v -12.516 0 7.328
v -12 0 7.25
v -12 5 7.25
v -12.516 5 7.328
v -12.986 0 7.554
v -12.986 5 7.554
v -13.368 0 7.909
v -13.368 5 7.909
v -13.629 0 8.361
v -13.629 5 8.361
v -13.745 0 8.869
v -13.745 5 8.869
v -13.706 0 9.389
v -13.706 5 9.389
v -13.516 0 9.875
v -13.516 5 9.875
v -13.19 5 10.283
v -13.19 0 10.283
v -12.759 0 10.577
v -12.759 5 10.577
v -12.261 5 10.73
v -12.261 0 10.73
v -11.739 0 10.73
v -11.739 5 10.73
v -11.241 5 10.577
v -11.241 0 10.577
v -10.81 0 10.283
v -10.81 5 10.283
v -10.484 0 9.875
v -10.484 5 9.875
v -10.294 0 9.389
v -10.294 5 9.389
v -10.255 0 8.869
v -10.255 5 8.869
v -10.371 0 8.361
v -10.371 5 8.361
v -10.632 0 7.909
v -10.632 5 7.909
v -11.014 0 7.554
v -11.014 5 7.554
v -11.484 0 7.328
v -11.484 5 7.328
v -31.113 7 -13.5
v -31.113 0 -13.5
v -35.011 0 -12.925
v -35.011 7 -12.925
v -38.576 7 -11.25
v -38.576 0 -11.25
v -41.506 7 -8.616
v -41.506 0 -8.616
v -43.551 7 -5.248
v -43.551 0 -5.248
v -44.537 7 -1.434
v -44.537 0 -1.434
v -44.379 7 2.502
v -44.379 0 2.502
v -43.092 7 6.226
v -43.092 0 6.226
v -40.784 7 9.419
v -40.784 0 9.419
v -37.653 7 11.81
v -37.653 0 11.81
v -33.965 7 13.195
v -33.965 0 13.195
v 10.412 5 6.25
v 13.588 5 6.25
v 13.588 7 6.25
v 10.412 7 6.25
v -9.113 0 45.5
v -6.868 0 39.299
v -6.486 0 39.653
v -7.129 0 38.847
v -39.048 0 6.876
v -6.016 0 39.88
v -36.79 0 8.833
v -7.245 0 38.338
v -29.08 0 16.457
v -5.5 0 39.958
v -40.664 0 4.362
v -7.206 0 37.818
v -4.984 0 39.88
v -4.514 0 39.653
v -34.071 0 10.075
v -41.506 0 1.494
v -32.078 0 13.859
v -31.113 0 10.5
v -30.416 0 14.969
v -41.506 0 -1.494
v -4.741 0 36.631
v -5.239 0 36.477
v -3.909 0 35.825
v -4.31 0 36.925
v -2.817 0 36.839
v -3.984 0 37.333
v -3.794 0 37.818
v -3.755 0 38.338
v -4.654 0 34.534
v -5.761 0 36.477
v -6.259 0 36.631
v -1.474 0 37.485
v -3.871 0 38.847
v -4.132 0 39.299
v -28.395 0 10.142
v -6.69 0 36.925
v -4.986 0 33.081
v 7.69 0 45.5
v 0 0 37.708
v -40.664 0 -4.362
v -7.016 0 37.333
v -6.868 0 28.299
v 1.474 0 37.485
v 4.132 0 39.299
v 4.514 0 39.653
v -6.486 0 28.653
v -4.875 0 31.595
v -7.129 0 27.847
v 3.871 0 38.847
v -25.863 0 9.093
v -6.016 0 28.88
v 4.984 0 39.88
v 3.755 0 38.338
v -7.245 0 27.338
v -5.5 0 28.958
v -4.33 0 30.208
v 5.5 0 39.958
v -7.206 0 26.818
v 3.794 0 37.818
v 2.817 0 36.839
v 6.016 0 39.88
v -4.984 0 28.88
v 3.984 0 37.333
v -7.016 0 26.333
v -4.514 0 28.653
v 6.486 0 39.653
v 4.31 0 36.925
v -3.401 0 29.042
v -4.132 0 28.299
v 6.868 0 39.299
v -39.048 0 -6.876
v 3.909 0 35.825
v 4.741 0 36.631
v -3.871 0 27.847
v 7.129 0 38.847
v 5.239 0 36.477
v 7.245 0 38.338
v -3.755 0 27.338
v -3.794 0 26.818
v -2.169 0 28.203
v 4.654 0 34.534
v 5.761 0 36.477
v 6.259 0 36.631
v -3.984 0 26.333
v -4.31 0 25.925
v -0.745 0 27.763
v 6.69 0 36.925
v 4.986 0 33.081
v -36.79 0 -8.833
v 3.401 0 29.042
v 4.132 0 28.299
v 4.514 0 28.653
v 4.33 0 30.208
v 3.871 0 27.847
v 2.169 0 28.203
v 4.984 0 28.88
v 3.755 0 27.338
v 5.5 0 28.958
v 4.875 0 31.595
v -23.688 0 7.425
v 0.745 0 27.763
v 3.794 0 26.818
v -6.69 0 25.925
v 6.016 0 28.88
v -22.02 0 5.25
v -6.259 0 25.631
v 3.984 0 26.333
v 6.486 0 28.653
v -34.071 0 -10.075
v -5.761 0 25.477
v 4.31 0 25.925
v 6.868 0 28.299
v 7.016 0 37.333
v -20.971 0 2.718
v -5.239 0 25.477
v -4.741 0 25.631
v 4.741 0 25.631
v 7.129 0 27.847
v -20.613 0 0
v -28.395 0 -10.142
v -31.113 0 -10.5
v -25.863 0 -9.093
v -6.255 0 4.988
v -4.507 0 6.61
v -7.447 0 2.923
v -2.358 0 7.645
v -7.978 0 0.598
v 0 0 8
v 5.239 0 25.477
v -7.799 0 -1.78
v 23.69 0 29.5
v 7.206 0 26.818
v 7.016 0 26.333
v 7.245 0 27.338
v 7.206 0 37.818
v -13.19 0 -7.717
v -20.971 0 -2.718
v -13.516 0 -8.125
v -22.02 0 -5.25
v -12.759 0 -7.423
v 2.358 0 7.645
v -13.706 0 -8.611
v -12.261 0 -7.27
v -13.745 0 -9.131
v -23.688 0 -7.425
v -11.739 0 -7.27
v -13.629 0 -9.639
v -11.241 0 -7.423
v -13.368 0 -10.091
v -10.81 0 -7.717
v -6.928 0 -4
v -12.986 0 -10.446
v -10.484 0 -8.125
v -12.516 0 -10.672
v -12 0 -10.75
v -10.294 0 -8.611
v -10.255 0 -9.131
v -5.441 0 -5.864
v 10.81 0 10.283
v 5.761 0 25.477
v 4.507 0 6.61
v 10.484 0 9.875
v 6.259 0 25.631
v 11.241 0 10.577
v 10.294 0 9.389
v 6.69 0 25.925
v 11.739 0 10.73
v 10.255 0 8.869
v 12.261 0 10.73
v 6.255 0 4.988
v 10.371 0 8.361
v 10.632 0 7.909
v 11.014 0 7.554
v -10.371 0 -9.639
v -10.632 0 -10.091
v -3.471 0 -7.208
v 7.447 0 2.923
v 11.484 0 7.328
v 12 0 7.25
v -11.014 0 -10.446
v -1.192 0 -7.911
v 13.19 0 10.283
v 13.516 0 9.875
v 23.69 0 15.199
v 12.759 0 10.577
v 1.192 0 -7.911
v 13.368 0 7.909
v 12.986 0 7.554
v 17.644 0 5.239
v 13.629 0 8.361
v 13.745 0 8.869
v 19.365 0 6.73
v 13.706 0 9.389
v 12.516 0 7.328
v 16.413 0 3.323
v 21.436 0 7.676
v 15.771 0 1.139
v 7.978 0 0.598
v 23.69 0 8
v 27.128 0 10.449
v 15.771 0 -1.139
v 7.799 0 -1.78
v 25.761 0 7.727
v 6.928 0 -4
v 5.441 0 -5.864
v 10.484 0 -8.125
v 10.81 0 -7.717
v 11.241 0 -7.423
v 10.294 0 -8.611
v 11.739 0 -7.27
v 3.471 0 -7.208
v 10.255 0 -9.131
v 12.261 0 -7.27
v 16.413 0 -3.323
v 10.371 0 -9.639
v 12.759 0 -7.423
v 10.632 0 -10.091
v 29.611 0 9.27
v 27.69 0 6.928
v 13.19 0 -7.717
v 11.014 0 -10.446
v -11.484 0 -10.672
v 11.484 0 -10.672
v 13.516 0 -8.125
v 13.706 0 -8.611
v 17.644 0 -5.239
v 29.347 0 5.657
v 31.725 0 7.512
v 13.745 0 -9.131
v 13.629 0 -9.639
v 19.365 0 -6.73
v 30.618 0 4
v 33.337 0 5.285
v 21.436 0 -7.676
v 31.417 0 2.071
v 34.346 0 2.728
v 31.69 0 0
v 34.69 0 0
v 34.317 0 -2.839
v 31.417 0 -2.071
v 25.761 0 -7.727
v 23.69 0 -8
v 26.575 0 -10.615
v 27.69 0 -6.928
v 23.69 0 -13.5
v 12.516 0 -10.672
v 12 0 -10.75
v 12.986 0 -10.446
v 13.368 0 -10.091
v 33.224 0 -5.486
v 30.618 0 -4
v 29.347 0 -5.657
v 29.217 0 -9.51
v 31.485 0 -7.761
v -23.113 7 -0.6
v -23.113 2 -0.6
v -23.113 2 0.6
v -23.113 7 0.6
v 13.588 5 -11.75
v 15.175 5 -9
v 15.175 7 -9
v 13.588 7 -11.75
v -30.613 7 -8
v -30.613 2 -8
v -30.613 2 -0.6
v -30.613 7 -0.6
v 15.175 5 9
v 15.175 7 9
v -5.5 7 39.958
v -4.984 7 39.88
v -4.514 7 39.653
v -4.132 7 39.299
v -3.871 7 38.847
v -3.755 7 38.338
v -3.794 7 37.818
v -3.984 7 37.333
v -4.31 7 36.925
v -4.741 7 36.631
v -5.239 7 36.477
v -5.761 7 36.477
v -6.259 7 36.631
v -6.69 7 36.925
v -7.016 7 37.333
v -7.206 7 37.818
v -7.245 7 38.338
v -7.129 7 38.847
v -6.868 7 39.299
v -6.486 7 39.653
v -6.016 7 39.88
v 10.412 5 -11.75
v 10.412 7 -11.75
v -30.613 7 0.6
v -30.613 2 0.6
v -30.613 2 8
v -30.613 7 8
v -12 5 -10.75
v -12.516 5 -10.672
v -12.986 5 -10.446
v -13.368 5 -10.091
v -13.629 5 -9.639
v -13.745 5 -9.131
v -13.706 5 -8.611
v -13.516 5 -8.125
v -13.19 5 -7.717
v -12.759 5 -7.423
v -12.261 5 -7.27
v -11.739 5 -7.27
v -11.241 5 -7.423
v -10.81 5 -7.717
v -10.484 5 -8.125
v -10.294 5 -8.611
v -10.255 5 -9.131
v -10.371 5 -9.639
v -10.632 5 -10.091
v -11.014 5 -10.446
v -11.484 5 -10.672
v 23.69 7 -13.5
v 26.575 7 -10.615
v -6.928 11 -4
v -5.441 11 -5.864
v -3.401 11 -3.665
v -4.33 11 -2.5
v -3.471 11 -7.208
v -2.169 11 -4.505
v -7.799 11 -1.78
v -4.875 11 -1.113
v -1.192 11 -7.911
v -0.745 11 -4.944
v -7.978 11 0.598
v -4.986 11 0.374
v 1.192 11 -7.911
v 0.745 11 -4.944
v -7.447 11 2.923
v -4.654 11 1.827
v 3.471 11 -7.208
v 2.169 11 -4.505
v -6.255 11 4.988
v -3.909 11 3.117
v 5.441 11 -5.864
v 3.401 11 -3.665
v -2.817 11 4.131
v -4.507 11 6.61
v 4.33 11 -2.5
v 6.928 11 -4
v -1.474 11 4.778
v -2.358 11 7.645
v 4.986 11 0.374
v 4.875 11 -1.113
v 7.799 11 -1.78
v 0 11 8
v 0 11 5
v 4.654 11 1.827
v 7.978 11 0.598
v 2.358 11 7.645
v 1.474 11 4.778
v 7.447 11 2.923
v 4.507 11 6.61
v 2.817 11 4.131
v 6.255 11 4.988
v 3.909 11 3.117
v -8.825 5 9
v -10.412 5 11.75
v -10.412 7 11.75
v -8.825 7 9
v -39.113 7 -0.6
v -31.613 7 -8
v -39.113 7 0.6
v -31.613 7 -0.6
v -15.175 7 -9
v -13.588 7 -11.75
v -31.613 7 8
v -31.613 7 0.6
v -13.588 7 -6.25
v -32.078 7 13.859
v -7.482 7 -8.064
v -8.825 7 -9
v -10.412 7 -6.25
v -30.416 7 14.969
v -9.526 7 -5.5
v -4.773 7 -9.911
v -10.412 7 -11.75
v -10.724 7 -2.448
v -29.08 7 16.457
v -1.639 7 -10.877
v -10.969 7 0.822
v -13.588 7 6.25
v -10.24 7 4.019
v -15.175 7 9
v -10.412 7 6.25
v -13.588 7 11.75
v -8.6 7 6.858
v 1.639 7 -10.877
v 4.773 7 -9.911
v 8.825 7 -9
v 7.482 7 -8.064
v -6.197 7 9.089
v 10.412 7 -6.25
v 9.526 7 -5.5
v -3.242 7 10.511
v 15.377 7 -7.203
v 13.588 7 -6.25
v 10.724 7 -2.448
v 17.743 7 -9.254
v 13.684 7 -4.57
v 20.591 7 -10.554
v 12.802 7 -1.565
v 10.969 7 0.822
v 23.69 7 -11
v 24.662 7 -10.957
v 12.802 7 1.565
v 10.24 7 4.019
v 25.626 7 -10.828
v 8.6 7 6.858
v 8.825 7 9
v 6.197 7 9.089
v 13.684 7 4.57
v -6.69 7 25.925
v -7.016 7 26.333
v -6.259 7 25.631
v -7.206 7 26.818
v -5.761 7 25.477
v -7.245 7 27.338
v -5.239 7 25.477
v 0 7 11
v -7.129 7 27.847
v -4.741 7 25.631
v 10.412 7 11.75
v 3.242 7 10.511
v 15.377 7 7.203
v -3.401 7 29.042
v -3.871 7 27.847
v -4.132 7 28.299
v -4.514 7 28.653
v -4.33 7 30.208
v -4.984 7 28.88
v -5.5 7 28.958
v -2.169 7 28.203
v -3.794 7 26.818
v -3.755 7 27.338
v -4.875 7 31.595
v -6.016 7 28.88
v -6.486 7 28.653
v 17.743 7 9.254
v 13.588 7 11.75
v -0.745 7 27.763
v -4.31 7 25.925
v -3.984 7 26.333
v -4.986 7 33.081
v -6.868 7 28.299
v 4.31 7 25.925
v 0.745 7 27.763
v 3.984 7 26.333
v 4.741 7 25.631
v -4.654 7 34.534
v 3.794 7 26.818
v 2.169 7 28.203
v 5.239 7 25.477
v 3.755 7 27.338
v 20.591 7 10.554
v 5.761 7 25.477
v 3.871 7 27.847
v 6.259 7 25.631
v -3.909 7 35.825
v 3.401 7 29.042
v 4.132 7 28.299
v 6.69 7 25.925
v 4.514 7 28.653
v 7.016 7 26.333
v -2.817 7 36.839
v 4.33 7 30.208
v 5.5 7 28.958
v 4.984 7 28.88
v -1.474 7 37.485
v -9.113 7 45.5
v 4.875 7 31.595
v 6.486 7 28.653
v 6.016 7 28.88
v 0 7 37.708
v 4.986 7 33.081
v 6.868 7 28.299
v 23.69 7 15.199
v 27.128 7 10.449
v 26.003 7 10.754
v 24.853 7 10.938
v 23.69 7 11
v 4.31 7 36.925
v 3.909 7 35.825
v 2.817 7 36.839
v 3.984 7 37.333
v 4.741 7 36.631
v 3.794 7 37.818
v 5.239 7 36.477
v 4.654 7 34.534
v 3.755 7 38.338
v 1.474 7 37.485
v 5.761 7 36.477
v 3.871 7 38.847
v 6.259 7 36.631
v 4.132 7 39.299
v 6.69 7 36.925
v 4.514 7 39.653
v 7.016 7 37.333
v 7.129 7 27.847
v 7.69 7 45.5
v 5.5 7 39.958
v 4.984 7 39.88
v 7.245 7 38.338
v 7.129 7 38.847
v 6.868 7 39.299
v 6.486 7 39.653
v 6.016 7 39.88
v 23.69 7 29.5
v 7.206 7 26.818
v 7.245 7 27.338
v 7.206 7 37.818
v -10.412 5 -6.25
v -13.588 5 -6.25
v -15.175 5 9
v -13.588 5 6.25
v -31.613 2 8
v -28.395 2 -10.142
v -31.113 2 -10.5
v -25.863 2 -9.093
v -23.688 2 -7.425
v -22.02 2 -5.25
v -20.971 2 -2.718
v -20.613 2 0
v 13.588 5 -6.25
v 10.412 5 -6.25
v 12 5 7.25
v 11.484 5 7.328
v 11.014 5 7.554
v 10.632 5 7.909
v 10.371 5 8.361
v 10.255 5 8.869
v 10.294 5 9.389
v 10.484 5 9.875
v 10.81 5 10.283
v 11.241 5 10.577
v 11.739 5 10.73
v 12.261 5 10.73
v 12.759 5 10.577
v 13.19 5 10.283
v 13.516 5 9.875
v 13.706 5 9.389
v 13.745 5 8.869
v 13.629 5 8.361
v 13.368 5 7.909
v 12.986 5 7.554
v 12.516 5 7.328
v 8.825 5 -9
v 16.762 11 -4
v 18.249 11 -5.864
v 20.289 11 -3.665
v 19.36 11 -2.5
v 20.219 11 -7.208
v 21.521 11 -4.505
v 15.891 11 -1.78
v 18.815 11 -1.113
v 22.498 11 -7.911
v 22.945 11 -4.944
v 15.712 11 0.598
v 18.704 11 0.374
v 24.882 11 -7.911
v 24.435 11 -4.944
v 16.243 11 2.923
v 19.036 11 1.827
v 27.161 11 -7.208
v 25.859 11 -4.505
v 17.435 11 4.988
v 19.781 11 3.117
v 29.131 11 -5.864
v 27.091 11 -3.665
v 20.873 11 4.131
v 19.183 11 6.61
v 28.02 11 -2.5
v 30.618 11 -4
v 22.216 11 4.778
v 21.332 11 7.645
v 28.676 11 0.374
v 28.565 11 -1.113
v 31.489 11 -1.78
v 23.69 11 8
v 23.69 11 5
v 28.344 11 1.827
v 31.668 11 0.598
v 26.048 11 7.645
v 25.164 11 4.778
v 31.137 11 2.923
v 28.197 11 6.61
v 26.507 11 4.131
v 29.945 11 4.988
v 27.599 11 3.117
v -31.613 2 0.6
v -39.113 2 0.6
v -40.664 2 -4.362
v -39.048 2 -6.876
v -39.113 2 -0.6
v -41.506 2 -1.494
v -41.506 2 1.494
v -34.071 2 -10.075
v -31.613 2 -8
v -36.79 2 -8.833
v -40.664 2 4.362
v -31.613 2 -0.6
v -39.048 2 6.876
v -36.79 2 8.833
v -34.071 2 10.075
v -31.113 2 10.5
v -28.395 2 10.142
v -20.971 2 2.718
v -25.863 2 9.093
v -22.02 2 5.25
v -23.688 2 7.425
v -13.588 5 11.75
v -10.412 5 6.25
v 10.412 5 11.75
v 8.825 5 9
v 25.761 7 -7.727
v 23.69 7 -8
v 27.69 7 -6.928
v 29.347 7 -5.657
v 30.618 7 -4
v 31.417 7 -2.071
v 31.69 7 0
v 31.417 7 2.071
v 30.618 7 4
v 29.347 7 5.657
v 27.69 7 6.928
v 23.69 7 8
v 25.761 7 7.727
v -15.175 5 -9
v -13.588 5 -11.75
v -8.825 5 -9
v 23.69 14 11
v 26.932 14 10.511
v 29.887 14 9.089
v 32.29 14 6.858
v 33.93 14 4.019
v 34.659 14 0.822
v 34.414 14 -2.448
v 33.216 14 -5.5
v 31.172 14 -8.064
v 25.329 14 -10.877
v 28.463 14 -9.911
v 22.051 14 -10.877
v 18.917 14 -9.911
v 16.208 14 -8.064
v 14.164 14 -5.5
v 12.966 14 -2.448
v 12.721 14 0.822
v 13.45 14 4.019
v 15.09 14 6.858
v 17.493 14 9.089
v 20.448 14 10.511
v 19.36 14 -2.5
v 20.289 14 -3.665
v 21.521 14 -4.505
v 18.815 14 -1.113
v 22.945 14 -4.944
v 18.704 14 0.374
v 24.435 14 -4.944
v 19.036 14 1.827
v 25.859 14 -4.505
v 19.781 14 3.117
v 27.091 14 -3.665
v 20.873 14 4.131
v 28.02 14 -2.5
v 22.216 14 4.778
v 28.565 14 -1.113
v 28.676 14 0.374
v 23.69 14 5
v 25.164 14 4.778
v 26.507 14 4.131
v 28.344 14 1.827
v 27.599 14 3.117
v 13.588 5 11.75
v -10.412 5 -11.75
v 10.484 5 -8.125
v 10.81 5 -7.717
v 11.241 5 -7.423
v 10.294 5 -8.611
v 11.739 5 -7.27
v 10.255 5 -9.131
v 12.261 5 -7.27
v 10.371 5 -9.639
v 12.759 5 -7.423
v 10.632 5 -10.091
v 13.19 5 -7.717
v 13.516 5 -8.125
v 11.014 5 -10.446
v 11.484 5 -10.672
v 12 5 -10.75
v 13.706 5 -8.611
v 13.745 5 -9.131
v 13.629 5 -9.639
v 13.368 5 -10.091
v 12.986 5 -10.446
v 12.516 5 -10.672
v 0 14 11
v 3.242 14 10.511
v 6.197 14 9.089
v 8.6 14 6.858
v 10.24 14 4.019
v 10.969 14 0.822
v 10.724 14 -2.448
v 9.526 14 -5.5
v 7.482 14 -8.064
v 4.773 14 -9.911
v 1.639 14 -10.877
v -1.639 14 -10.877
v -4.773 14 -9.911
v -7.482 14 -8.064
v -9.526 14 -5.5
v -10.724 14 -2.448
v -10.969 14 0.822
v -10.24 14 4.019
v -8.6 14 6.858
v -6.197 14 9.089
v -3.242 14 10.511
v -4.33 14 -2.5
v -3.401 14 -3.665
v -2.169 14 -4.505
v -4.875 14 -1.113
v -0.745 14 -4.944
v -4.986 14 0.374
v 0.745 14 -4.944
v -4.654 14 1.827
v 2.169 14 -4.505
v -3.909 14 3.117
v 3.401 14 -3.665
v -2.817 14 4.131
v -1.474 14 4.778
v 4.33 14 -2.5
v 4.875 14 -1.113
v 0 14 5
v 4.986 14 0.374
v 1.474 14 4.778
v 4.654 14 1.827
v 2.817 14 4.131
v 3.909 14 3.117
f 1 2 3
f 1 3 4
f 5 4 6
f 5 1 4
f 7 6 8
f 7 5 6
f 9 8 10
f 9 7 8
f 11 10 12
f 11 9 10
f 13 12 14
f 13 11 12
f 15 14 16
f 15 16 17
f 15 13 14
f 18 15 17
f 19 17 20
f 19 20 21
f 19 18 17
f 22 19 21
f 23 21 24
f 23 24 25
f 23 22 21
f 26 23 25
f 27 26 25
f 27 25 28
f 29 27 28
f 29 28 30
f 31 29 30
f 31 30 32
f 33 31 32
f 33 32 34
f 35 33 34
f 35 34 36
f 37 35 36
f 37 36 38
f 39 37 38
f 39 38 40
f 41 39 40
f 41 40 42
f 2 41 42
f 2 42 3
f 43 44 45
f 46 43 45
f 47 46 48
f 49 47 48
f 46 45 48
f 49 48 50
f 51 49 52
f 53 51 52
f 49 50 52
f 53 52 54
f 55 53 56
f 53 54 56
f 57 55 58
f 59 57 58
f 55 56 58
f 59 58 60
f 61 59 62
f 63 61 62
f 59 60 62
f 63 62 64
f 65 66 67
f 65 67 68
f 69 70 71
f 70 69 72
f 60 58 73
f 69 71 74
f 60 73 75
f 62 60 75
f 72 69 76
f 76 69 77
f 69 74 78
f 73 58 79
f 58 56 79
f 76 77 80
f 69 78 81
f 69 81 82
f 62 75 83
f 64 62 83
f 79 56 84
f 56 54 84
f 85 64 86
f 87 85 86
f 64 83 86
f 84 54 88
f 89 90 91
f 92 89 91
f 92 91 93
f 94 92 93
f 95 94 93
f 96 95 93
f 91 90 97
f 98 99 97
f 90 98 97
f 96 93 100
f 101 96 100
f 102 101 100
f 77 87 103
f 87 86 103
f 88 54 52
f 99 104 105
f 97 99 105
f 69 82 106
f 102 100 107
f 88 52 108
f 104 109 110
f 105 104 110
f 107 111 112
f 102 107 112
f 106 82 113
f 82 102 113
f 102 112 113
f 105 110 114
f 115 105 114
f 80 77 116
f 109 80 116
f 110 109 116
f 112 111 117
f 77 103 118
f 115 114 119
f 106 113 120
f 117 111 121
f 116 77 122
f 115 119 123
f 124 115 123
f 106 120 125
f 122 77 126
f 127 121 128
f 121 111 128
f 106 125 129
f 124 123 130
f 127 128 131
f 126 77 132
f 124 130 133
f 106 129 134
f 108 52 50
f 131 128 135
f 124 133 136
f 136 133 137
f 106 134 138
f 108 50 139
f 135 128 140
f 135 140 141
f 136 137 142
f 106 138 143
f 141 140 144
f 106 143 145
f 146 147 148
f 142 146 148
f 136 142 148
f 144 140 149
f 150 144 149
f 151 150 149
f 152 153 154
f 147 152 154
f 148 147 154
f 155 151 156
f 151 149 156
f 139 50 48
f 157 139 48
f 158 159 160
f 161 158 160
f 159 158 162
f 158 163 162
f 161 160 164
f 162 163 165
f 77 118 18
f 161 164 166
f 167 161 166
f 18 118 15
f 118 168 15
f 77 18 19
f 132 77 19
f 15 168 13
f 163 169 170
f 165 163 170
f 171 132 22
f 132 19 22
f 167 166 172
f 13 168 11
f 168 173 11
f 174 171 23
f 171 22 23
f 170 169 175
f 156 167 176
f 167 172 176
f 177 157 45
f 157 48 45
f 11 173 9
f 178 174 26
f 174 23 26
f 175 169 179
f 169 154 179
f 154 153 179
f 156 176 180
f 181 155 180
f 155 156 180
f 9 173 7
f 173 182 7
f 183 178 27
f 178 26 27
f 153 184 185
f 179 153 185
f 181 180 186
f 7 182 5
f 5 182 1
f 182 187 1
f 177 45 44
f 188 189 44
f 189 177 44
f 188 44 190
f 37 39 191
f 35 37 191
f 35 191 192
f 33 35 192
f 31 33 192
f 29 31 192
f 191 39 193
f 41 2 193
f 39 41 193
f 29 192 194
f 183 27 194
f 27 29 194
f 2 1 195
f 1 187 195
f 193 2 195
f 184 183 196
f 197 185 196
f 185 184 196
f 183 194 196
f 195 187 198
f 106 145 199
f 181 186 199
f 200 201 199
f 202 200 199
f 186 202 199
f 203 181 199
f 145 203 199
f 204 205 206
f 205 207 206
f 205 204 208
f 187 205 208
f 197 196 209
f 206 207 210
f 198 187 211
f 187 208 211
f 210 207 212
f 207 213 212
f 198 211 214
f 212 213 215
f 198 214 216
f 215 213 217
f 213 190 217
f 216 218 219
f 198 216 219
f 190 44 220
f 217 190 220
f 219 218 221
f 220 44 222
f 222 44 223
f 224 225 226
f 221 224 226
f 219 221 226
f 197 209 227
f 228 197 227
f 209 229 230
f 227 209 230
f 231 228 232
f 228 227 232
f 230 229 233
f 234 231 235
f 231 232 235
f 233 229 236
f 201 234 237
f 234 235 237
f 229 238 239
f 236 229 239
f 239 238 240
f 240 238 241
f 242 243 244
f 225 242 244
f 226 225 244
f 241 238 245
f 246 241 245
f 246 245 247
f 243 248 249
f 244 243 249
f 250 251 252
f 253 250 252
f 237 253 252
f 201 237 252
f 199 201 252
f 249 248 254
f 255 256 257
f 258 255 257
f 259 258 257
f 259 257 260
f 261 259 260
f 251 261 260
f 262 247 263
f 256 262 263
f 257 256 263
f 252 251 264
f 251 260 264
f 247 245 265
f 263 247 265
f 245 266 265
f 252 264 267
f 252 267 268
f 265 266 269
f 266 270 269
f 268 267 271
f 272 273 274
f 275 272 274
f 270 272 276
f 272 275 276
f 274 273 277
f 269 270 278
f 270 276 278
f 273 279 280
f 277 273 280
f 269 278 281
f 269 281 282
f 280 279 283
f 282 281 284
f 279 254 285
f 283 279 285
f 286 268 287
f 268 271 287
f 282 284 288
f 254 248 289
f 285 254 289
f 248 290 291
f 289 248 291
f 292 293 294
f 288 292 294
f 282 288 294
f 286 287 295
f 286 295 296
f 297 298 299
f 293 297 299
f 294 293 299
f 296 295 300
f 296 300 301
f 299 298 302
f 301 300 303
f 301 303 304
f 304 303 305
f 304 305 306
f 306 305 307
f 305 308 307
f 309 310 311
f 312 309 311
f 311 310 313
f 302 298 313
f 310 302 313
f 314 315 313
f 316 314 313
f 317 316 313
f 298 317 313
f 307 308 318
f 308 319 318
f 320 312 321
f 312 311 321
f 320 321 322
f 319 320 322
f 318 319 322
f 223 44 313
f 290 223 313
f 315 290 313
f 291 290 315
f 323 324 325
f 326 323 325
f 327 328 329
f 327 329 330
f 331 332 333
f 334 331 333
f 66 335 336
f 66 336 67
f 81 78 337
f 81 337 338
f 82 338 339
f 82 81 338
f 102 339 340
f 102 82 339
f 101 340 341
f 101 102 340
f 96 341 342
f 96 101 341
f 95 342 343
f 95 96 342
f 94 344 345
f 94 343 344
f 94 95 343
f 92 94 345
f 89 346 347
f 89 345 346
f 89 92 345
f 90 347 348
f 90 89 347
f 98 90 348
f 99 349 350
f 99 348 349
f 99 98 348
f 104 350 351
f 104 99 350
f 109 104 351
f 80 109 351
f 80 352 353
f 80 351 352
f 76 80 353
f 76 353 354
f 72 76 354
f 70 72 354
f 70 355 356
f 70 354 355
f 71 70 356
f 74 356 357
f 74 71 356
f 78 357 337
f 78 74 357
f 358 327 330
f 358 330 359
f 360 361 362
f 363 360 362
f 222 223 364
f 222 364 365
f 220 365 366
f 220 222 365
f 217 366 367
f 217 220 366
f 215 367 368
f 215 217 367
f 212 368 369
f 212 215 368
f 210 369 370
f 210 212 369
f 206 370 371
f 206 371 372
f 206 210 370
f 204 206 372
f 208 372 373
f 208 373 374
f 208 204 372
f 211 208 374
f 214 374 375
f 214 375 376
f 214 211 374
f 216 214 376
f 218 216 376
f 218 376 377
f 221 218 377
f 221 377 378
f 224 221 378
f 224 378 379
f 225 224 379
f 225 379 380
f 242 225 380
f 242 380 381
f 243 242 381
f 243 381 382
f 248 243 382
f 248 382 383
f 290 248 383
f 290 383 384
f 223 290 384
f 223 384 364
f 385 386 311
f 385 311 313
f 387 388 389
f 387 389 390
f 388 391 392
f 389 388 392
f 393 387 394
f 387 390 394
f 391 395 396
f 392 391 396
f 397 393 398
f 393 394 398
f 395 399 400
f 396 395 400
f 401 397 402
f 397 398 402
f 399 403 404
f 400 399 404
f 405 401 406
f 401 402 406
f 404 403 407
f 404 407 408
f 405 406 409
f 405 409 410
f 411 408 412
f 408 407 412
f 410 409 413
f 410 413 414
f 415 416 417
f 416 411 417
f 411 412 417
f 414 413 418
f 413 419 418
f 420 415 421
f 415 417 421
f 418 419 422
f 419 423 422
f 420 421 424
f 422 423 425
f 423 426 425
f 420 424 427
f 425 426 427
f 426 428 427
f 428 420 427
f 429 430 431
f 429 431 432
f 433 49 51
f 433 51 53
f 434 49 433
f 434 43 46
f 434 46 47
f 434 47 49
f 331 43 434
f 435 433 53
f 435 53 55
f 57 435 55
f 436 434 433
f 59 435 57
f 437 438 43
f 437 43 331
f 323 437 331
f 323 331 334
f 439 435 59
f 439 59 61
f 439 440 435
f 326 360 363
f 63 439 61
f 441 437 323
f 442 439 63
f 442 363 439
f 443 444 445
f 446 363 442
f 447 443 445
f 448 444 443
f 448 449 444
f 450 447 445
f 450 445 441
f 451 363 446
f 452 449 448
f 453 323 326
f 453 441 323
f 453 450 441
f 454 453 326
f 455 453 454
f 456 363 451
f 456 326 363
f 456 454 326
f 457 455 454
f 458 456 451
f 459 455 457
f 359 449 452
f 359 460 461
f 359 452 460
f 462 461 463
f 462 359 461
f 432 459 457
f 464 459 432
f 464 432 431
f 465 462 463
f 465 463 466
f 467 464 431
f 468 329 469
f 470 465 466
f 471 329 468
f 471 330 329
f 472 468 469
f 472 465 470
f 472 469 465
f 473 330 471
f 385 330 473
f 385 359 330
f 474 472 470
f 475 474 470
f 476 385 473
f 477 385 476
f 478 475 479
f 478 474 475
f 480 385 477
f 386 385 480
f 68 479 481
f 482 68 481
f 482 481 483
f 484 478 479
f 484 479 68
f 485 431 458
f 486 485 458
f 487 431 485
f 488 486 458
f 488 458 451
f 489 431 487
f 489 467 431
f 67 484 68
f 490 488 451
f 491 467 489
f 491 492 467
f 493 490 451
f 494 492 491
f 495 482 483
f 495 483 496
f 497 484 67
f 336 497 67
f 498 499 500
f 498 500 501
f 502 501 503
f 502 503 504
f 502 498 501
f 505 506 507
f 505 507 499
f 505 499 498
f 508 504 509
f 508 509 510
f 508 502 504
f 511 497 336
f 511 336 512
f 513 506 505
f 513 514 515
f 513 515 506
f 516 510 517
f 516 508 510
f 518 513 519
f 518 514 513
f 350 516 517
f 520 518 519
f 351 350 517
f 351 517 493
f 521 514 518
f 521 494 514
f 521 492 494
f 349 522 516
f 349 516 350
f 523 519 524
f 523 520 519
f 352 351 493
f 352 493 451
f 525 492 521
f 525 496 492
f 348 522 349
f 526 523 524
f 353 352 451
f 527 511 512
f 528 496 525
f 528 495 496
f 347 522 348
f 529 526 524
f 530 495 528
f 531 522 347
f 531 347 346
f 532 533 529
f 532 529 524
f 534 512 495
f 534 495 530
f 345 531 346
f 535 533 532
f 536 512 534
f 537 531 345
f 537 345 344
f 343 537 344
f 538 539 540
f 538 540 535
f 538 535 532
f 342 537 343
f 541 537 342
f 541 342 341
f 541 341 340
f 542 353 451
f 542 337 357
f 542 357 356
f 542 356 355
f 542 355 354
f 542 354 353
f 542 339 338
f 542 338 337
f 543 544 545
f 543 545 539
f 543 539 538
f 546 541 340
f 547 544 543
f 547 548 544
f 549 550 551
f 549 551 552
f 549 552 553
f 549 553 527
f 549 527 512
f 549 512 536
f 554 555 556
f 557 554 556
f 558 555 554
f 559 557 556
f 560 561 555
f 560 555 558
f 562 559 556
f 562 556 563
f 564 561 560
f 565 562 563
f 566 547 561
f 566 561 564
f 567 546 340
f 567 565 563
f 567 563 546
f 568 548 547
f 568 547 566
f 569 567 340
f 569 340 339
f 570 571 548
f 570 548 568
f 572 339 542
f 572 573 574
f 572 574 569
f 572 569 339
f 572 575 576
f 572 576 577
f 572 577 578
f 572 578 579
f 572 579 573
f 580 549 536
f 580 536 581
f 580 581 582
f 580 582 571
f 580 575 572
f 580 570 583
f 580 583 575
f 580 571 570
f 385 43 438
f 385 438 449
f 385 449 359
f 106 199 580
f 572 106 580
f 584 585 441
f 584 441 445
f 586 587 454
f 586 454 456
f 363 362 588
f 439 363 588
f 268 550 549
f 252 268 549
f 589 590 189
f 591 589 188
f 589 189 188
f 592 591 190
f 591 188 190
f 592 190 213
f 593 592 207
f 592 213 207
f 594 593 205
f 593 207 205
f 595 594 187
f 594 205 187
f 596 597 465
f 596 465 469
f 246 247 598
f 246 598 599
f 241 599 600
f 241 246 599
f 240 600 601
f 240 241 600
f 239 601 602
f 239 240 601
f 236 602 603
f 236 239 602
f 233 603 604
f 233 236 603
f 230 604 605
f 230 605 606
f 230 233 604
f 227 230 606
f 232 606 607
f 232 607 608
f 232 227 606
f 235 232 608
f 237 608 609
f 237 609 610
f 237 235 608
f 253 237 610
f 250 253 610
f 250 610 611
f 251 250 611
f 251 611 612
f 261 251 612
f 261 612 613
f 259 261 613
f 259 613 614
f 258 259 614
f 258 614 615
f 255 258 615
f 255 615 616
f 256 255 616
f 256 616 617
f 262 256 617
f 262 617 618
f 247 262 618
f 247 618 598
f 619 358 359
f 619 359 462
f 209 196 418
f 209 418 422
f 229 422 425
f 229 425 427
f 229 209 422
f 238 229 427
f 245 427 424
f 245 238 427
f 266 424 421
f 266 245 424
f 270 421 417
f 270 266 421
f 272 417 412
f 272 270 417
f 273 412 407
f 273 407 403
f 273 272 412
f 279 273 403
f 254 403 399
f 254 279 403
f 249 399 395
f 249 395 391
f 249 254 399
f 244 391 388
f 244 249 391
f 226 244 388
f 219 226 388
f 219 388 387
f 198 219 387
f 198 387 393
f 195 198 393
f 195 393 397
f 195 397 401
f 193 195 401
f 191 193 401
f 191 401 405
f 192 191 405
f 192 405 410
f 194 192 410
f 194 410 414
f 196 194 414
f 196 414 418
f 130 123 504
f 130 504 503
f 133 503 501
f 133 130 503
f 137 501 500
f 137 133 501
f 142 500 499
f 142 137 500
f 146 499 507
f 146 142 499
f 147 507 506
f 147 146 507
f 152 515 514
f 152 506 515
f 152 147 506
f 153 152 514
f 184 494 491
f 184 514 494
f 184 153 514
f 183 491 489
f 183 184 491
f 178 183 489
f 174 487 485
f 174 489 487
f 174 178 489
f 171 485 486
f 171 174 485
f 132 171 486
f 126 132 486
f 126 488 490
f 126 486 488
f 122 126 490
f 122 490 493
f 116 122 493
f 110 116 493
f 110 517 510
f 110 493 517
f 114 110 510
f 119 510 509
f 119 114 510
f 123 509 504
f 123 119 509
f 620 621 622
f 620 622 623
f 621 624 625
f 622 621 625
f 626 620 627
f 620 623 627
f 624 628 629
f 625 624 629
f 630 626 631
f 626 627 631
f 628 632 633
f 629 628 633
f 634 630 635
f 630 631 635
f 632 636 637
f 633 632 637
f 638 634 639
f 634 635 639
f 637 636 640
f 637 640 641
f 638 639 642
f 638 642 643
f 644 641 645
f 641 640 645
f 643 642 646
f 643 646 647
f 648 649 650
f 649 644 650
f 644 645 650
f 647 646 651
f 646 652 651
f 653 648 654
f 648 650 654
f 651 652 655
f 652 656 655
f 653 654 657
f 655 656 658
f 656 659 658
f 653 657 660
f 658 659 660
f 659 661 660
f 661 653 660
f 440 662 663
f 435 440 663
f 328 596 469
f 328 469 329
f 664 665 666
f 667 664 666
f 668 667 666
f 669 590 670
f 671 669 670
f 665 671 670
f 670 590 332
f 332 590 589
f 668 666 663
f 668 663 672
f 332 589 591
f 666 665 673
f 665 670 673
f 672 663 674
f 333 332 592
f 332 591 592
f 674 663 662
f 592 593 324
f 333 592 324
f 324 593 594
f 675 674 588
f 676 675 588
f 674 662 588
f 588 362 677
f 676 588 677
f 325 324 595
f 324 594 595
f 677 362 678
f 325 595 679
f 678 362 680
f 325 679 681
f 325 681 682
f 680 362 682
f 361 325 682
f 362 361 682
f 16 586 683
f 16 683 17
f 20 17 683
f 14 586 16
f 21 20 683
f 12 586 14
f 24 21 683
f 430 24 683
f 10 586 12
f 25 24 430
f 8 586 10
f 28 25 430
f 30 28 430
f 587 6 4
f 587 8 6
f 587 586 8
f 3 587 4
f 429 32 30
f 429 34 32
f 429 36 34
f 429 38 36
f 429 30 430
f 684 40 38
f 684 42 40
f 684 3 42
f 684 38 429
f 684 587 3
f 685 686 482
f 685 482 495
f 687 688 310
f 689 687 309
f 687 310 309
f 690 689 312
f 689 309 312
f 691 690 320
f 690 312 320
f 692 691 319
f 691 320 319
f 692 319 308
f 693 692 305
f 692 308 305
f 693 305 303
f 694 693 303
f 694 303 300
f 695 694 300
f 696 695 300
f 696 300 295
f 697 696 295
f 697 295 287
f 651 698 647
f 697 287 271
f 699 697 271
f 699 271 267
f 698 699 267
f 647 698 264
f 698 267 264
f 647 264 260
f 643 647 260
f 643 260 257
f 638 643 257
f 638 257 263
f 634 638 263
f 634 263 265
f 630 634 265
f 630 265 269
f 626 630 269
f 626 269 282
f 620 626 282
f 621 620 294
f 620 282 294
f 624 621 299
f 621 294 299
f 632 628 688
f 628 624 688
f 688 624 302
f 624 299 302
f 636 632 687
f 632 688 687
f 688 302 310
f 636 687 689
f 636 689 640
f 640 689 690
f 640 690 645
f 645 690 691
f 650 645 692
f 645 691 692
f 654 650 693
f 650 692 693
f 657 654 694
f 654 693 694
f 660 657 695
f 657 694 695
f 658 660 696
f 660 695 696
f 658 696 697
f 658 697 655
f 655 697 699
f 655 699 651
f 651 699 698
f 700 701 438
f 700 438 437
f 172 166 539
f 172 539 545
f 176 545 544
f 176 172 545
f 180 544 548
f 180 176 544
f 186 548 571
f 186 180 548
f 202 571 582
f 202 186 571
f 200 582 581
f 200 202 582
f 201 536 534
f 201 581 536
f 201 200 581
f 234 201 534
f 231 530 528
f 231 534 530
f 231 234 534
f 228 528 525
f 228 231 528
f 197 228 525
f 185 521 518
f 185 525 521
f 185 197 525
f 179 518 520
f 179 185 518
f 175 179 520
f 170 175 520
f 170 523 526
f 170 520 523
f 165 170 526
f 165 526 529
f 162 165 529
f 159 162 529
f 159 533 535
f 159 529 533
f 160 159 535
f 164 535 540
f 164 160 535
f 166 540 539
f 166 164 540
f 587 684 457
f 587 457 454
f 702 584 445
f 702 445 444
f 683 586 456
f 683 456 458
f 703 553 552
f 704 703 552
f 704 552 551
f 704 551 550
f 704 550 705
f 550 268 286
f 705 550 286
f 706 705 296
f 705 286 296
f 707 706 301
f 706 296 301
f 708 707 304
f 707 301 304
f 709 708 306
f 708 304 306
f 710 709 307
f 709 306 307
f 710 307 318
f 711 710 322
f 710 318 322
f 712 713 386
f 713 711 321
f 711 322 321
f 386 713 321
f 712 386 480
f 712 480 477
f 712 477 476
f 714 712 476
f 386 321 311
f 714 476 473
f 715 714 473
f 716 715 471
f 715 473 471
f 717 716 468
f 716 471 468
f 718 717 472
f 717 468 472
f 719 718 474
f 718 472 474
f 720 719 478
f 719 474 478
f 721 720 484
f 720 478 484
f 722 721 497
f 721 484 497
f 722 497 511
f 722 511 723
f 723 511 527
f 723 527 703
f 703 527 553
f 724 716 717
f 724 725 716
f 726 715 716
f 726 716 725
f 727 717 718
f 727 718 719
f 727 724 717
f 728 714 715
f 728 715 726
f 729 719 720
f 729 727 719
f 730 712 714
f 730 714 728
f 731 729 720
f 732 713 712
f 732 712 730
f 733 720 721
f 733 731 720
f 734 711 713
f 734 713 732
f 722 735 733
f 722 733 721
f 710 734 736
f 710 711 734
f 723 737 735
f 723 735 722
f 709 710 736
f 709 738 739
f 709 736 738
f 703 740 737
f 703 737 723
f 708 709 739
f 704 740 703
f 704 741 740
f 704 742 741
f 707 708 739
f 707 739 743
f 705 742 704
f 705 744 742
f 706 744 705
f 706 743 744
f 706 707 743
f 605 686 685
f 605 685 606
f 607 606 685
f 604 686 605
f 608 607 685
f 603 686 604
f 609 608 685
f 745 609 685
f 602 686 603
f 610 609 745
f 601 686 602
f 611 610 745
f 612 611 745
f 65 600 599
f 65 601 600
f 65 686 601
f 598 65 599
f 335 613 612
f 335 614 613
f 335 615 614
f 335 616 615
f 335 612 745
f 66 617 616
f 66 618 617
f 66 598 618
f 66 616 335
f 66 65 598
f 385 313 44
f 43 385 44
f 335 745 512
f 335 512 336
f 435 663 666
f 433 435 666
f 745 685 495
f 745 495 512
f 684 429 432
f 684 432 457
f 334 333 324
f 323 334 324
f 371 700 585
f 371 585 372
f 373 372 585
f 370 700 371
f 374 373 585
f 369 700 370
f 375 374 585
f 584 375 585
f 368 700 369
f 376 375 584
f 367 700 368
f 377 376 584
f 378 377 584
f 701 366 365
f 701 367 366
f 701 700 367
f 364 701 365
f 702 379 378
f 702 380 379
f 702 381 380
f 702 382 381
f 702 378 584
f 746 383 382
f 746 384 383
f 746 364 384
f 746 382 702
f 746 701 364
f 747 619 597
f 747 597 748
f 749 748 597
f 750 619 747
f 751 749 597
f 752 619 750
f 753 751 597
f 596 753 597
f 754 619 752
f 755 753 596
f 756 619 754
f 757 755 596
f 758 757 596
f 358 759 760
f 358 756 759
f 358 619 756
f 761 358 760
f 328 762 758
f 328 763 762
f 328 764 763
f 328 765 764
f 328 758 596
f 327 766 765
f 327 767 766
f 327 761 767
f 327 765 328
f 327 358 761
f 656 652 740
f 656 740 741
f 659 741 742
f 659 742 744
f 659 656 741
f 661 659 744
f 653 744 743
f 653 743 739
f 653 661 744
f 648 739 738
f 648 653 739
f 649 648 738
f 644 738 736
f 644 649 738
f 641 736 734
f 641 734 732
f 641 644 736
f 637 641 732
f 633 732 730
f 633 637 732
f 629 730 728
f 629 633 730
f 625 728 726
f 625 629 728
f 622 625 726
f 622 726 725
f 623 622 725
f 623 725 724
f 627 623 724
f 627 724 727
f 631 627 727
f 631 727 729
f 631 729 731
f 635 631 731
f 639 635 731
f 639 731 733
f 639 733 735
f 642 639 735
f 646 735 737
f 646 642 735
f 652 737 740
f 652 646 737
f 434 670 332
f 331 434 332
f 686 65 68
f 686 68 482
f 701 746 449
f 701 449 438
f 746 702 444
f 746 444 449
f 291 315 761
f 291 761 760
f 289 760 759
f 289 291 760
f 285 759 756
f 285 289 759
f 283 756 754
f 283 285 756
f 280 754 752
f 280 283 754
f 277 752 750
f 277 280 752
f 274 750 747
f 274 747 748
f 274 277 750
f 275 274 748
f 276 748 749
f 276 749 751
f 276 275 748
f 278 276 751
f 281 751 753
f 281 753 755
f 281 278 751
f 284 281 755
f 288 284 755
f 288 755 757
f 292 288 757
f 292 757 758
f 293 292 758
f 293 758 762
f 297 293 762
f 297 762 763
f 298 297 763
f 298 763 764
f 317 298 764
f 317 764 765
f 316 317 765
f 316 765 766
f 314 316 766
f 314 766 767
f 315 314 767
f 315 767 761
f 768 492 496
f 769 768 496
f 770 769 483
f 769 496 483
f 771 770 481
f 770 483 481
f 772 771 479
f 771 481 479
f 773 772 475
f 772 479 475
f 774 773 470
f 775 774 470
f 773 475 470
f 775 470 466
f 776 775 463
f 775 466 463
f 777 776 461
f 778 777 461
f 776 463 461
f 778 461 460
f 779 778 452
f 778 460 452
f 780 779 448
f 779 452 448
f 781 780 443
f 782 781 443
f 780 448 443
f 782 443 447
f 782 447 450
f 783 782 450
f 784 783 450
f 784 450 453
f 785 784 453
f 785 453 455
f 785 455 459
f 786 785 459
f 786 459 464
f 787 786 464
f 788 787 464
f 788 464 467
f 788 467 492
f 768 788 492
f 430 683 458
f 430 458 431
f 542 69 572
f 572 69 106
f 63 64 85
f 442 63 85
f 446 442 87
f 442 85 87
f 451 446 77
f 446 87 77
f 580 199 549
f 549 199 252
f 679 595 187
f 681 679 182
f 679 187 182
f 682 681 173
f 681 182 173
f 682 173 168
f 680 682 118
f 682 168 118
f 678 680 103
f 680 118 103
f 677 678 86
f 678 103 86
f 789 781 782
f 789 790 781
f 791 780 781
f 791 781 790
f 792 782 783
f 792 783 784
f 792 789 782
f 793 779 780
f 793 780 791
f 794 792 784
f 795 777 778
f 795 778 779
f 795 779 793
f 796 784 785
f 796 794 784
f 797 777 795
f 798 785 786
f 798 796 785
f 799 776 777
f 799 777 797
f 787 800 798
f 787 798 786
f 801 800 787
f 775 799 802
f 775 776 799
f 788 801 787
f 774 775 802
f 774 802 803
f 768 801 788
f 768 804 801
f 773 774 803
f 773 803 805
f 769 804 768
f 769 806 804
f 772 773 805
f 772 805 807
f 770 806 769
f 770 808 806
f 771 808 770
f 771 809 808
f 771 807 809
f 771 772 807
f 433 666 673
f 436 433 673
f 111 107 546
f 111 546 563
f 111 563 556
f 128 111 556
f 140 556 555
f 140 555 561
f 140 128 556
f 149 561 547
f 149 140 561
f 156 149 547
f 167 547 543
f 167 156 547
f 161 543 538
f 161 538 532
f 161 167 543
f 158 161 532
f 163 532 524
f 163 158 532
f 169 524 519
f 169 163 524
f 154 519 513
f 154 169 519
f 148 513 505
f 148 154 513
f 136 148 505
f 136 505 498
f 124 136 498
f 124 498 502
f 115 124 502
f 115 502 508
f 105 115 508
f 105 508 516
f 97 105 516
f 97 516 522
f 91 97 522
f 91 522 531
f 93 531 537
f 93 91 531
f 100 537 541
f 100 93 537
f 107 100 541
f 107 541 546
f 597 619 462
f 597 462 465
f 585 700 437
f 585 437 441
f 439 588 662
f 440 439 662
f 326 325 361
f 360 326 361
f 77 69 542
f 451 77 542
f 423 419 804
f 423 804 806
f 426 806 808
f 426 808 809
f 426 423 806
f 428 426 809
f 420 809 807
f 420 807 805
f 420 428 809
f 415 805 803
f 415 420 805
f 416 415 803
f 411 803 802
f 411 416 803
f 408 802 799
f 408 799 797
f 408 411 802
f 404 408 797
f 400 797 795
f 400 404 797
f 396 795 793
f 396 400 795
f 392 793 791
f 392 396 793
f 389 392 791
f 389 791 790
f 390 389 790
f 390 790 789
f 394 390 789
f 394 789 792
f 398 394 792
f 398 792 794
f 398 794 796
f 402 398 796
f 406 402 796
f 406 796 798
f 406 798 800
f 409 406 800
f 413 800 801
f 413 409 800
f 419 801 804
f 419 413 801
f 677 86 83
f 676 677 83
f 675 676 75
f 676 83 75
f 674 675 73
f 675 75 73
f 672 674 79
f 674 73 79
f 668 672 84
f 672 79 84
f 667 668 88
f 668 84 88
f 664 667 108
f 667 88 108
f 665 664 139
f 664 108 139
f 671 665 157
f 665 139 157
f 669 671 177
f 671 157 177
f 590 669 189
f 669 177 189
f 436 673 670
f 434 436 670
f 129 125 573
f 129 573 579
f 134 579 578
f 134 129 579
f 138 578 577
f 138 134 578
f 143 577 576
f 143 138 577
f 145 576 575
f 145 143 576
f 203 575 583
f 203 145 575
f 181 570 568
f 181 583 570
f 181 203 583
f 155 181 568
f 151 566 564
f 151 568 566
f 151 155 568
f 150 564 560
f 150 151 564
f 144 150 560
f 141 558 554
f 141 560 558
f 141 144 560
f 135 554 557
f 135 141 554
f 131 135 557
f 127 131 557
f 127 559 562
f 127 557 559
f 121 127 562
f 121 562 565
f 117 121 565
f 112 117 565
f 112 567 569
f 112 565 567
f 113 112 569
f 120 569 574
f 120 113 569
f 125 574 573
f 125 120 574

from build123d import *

# Parameters (mm, degrees)
SKETCH3_R               = 8
SKETCH3_W               = 54.803
SKETCH3_H               = 32
SKETCH3_R_2             = 5
BOSS_EXTRUDE1_DEPTH     = 7
CUT_EXTRUDE3_DEPTH      = 65.105926161
CUT_EXTRUDE3_DEPTH_BACK = 65.105926161
SKETCH4_R               = 1.75
SKETCH6_R               = 11
SKETCH6_R_2             = 8
BOSS_EXTRUDE2_DEPTH     = 4
SKETCH7_R               = 11
SKETCH7_R_2             = 5
BOSS_EXTRUDE3_DEPTH     = 3
CHAMFER1_SIZE           = 2.5
CUT_EXTRUDE5_DEPTH      = 66.242392422
CUT_EXTRUDE5_DEPTH_BACK = 66.242392422
SKETCH9_R               = 1.75
CUT_EXTRUDE6_START      = -2
SKETCH10_R              = 1.75
CUT_EXTRUDE6_DEPTH      = 2
CHAMFER3_SIZE2          = 32
CHAMFER3_SIZE           = 22
CHAMFER4_SIZE           = 16
FILLET1_DEPTH           = 7
BOSS_EXTRUDE6_START     = -5
SKETCH15_R              = 10.5
BOSS_EXTRUDE6_DEPTH     = 5


with BuildPart() as part:
    # Sketch3 → Boss-Extrude1 (new body)
    # profile 1 of 10: a face of its own
    with BuildSketch(Plane(origin=(0, 0, 0), x_dir=(1, 0, 0), z_dir=(0, 1, 0))):
        with BuildLine():
            ThreePointArc((-17.613, 0), (-21.567058454, 9.545941546), (-31.113, 13.5))
            Line((-31.113, 13.5), (-31.113, 10.5))
            ThreePointArc((-31.113, 10.5), (-23.688378798, 7.424621202), (-20.613, 0))
            ThreePointArc((-20.613, 0), (-23.688378798, -7.424621202), (-31.113, -10.5))
            Line((-31.113, -10.5), (-31.113, -13.5))
            ThreePointArc((-31.113, -13.5), (-21.567058454, -9.545941546), (-17.613, 0))
        make_face()
    # profile 2 of 10: a face of its own
    with BuildSketch(Plane(origin=(0, 0, 0), x_dir=(1, 0, 0), z_dir=(0, 1, 0))):
        with BuildLine():
            Line((-31.113, 10.5), (-31.113, 13.5))
            ThreePointArc((-31.113, 13.5), (-44.613, 0), (-31.113, -13.5))
            Line((-31.113, -13.5), (-31.113, -10.5))
            ThreePointArc((-31.113, -10.5), (-41.613, 0), (-31.113, 10.5))
        make_face()
    # profile 3 of 10: a face of its own
    with BuildSketch(Plane(origin=(0, 0, 0), x_dir=(1, 0, 0), z_dir=(0, 1, 0))):
        with BuildLine():
            Line((23.69, 13.5), (-31.113, 13.5))
            ThreePointArc((-31.113, 13.5), (-21.567058454, 9.545941546), (-17.613, 0))
            ThreePointArc((-17.613, 0), (-21.567058454, -9.545941546), (-31.113, -13.5))
            Line((-31.113, -13.5), (23.69, -13.5))
            Line((23.69, -13.5), (23.69, -11))
            ThreePointArc((23.69, -11), (12.69, 0), (23.69, 11))
            Line((23.69, 11), (23.69, 13.5))
        make_face()
        with Locations(Location((0, 0, 0), (0, 0, 270))):
            Circle(SKETCH3_R, mode=Mode.SUBTRACT)
    # profile 4 of 10: a face of its own
    with BuildSketch(Plane(origin=(0, 0, 0), x_dir=(1, 0, 0), z_dir=(0, 1, 0))):
        with BuildLine():
            ThreePointArc((-17.613, 0), (-21.567058454, 9.545941546), (-31.113, 13.5))
            Line((-31.113, 13.5), (-31.113, 10.5))
            ThreePointArc((-31.113, 10.5), (-23.688378798, 7.424621202), (-20.613, 0))
            ThreePointArc((-20.613, 0), (-23.688378798, -7.424621202), (-31.113, -10.5))
            Line((-31.113, -10.5), (-31.113, -13.5))
            ThreePointArc((-31.113, -13.5), (-21.567058454, -9.545941546), (-17.613, 0))
        make_face()
    # profile 5 of 10: a face of its own
    with BuildSketch(Plane(origin=(0, 0, 0), x_dir=(1, 0, 0), z_dir=(0, 1, 0))):
        with BuildLine():
            Line((-31.113, 10.5), (-31.113, 13.5))
            ThreePointArc((-31.113, 13.5), (-44.613, 0), (-31.113, -13.5))
            Line((-31.113, -13.5), (-31.113, -10.5))
            ThreePointArc((-31.113, -10.5), (-41.613, 0), (-31.113, 10.5))
        make_face()
    # profile 6 of 10: a face of its own
    with BuildSketch(Plane(origin=(0, 0, 0), x_dir=(1, 0, 0), z_dir=(0, 1, 0))):
        with BuildLine():
            ThreePointArc((34.69, 0), (31.468174593, 7.778174593), (23.69, 11))
            Line((23.69, 11), (23.69, 8))
            ThreePointArc((23.69, 8), (29.346854249, 5.656854249), (31.69, 0))
            ThreePointArc((31.69, 0), (29.346854249, -5.656854249), (23.69, -8))
            Line((23.69, -8), (23.69, -11))
            ThreePointArc((23.69, -11), (31.468174593, -7.778174593), (34.69, 0))
        make_face()
    # profile 7 of 10: a face of its own
    with BuildSketch(Plane(origin=(0, 0, 0), x_dir=(1, 0, 0), z_dir=(0, 1, 0))):
        with BuildLine():
            Line((23.69, 8), (23.69, 11))
            ThreePointArc((23.69, 11), (12.69, 0), (23.69, -11))
            Line((23.69, -11), (23.69, -8))
            ThreePointArc((23.69, -8), (15.69, 0), (23.69, 8))
        make_face()
    # profile 8 of 10: a face of its own
    with BuildSketch(Plane(origin=(0, 0, 0), x_dir=(1, 0, 0), z_dir=(0, 1, 0))):
        with Locations((-3.7115, -29.5)):
            Rectangle(SKETCH3_W, SKETCH3_H)
        with Locations(Location((0, -32.707574931, 0), (0, 0, 270))):
            Circle(SKETCH3_R_2, mode=Mode.SUBTRACT)
    # profile 9 of 10: a face of its own
    with BuildSketch(Plane(origin=(0, 0, 0), x_dir=(1, 0, 0), z_dir=(0, 1, 0))):
        with BuildLine():
            ThreePointArc((34.69, 0), (31.468174593, 7.778174593), (23.69, 11))
            Line((23.69, 11), (23.69, 8))
            ThreePointArc((23.69, 8), (29.346854249, 5.656854249), (31.69, 0))
            ThreePointArc((31.69, 0), (29.346854249, -5.656854249), (23.69, -8))
            Line((23.69, -8), (23.69, -11))
            ThreePointArc((23.69, -11), (31.468174593, -7.778174593), (34.69, 0))
        make_face()
    # profile 10 of 10: a face of its own
    with BuildSketch(Plane(origin=(0, 0, 0), x_dir=(1, 0, 0), z_dir=(0, 1, 0))):
        with BuildLine():
            Line((23.69, 8), (23.69, 11))
            ThreePointArc((23.69, 11), (12.69, 0), (23.69, -11))
            Line((23.69, -11), (23.69, -8))
            ThreePointArc((23.69, -8), (15.69, 0), (23.69, 8))
        make_face()
    extrude(amount=BOSS_EXTRUDE1_DEPTH)

    # Sketch4 → Cut-Extrude3 (cut, two sides: drawn at the far end of the back side and taken through both)
    with BuildSketch(Plane(origin=(0, 0, 0), x_dir=(1, 0, 0), z_dir=(0, 1, 0)).offset(-CUT_EXTRUDE3_DEPTH_BACK)):
        with Locations(Location((5.5, -27.207574931, 0), (0, 0, 270))):
            Circle(SKETCH4_R)
        with Locations(Location((5.5, -38.207574931, 0), (0, 0, 270))):
            Circle(SKETCH4_R)
        with Locations(Location((-5.5, -38.207574931, 0), (0, 0, 270))):
            Circle(SKETCH4_R)
        with Locations(Location((-5.5, -27.207574931, 0), (0, 0, 270))):
            Circle(SKETCH4_R)
    extrude(amount=CUT_EXTRUDE3_DEPTH + CUT_EXTRUDE3_DEPTH_BACK, mode=Mode.SUBTRACT)

    # Sketch6 → Boss-Extrude2 (add)
    # profile 1 of 2: a face of its own
    with BuildSketch(Plane(origin=(0, 7, 0), x_dir=(1, 0, 0), z_dir=(0, 1, 0))):
        with Locations(Location((23.69, 0, 0), (0, 0, 270))):
            Circle(SKETCH6_R)
        with Locations(Location((23.69, 0, 0), (0, 0, 270))):
            Circle(SKETCH6_R_2, mode=Mode.SUBTRACT)
    # profile 2 of 2: a face of its own
    with BuildSketch(Plane(origin=(0, 7, 0), x_dir=(1, 0, 0), z_dir=(0, 1, 0))):
        with Locations(Location((0, 0, 0), (0, 0, 270))):
            Circle(SKETCH6_R)
        with Locations(Location((0, 0, 0), (0, 0, 270))):
            Circle(SKETCH6_R_2, mode=Mode.SUBTRACT)
    extrude(amount=BOSS_EXTRUDE2_DEPTH)

    # Sketch7 → Boss-Extrude3 (add)
    # profile 1 of 2: a face of its own
    with BuildSketch(Plane(origin=(0, 11, 0), x_dir=(1, 0, 0), z_dir=(0, 1, 0))):
        with Locations(Location((23.69, 0, 0), (0, 0, 270))):
            Circle(SKETCH7_R)
        with Locations(Location((23.69, 0, 0), (0, 0, 270))):
            Circle(SKETCH7_R_2, mode=Mode.SUBTRACT)
    # profile 2 of 2: a face of its own
    with BuildSketch(Plane(origin=(0, 11, 0), x_dir=(1, 0, 0), z_dir=(0, 1, 0))):
        with Locations(Location((0, 0, 0), (0, 0, 270))):
            Circle(SKETCH7_R)
        with Locations(Location((0, 0, 0), (0, 0, 270))):
            Circle(SKETCH7_R_2, mode=Mode.SUBTRACT)
    extrude(amount=BOSS_EXTRUDE3_DEPTH)

    # Chamfer1
    # the kernel refuses this chamfer: 2.5 mm, written as the material it adds along each edge
    with BuildSketch(Plane(origin=(23.69, 0, -11), x_dir=(0.9912092295509807, 0, 0.13230367815352426), z_dir=(0, 1, 0))) as chamfer1_piece_1_section:
        with BuildLine():
            Line((2.910680919, 0), (-CHAMFER1_SIZE * 0.132303678154, CHAMFER1_SIZE * 0.991209229551))
            Line((-CHAMFER1_SIZE * 0.132303678154, CHAMFER1_SIZE * 0.991209229551), (0, 0))
            ThreePointArc((0, 0), (1.49552658, 0.096625069), (2.910680919, 0))
        make_face()
    chamfer1_piece_1 = extrude(amount=7, mode=Mode.PRIVATE)
    chamfer1_piece_1 = split(chamfer1_piece_1, bisect_by=Plane(origin=(23.69, 0, -13.5), z_dir=(0, 0, 1)), keep=Keep.TOP, mode=Mode.PRIVATE)
    add(chamfer1_piece_1)

    # Sketch9 → Cut-Extrude5 (cut, two sides: drawn at the far end of the back side and taken through both)
    with BuildSketch(Plane(origin=(0, 0, 0), x_dir=(1, 0, 0), z_dir=(0, 1, 0)).offset(-CUT_EXTRUDE5_DEPTH_BACK)):
        with Locations(Location((12, 9, 0), (0, 0, 90))):
            Circle(SKETCH9_R)
        with Locations(Location((12, -9, 0), (0, 0, 90))):
            Circle(SKETCH9_R)
        with Locations(Location((-12, -9, 0), (0, 0, 90))):
            Circle(SKETCH9_R)
        with Locations(Location((-12, 9, 0), (0, 0, 90))):
            Circle(SKETCH9_R)
    extrude(amount=CUT_EXTRUDE5_DEPTH + CUT_EXTRUDE5_DEPTH_BACK, mode=Mode.SUBTRACT)

    # Sketch10 → Cut-Extrude6 (cut)
    # profile 1 of 4: a face of its own
    with BuildSketch(Plane(origin=(0, 7, 0), x_dir=(1, 0, 0), z_dir=(0, 1, 0)).offset(CUT_EXTRUDE6_START)):
        Polygon((-15.175426481, -9), (-13.58771324, -11.75), (-10.41228676, -11.75), (-8.824573519, -9), (-10.41228676, -6.25), (-13.58771324, -6.25), align=None)
        with Locations(Location((-12, -9, 0), (0, 0, 90))):
            Circle(SKETCH10_R, mode=Mode.SUBTRACT)
    # profile 2 of 4: a face of its own
    with BuildSketch(Plane(origin=(0, 7, 0), x_dir=(1, 0, 0), z_dir=(0, 1, 0)).offset(CUT_EXTRUDE6_START)):
        Polygon((-15.175426481, 9), (-13.58771324, 6.25), (-10.41228676, 6.25), (-8.824573519, 9), (-10.41228676, 11.75), (-13.58771324, 11.75), align=None)
        with Locations(Location((-12, 9, 0), (0, 0, 90))):
            Circle(SKETCH10_R, mode=Mode.SUBTRACT)
    # profile 3 of 4: a face of its own
    with BuildSketch(Plane(origin=(0, 7, 0), x_dir=(1, 0, 0), z_dir=(0, 1, 0)).offset(CUT_EXTRUDE6_START)):
        Polygon((15.175426481, 9), (13.58771324, 11.75), (10.41228676, 11.75), (8.824573519, 9), (10.41228676, 6.25), (13.58771324, 6.25), align=None)
        with Locations(Location((12, 9, 0), (0, 0, 90))):
            Circle(SKETCH10_R, mode=Mode.SUBTRACT)
    # profile 4 of 4: a face of its own
    with BuildSketch(Plane(origin=(0, 7, 0), x_dir=(1, 0, 0), z_dir=(0, 1, 0)).offset(CUT_EXTRUDE6_START)):
        Polygon((15.175426481, -9), (13.58771324, -6.25), (10.41228676, -6.25), (8.824573519, -9), (10.41228676, -11.75), (13.58771324, -11.75), align=None)
        with Locations(Location((12, -9, 0), (0, 0, 90))):
            Circle(SKETCH10_R, mode=Mode.SUBTRACT)
    extrude(amount=CUT_EXTRUDE6_DEPTH, mode=Mode.SUBTRACT)

    # Chamfer2
    # the kernel refuses this chamfer: 5 mm, written as the material it adds along each edge
    with BuildSketch(Plane(origin=(23.69, 0, 11), x_dir=(0.9874000606639179, 0, -0.15824386307497393), z_dir=(0, 1, 0))) as chamfer2_piece_1:
        with BuildLine():
            Line((3.622786344, 0.141421356), (-0.805837357, -4.287202344))
            Line((-0.805837357, -4.287202344), (-0.904577363, -4.271377958))
            ThreePointArc((-0.904577363, -4.271377958), (-0.443767224, -2.137054655), (-0.098740006, 0.015824386))
            Line((-0.098740006, 0.015824386), (0.015824386, 0.098740006))
            ThreePointArc((0.015824386, 0.098740006), (1.81210794, -0.038365312), (3.606961958, 0.240161362))
            Line((3.606961958, 0.240161362), (3.622786344, 0.141421356))
        make_face()
    extrude(amount=7)

    # Chamfer3
    chamfer3_edges = [part.edges().sort_by_distance(p)[0] for p in [
        (-31.113, 3.5, 45.5),
    ]]
    chamfer3_side = [part.faces().sort_by_distance(p)[0] for p in [
        (-30.673, 3.5, 45.5),
    ]]
    chamfer(chamfer3_edges, length=CHAMFER3_SIZE - 0.0001, length2=CHAMFER3_SIZE2 - 0.0001, reference=chamfer3_side[0])  # a hair under: the kernel refuses the full size

    # Chamfer4
    chamfer4_edges = [part.edges().sort_by_distance(p)[0] for p in [
        (23.69, 3.5, 45.5),
    ]]
    chamfer(chamfer4_edges, length=CHAMFER4_SIZE)

    # Fillet1: read off the stored shape, not the designer's step
    # Fillet1 outline → Fillet1 (add)
    with BuildSketch(Plane(origin=(0, 0, 0), x_dir=(1, 0, 0), z_dir=(0, 1, 0))):
        with BuildLine():
            ThreePointArc((-31.113, -13.5), (-32.547033058, -13.423619079), (-33.96483904, -13.19534062))
            ThreePointArc((-33.96483904, -13.19534062), (-31.199410591, -14.370304214), (-29.062482337, -16.482571146))
            Line((-29.062482337, -16.482571146), (-31.113, -13.5))
        make_face()
    extrude(amount=FILLET1_DEPTH)

    # Sketch15 → Boss-Extrude6 (add)
    with BuildSketch(Plane(origin=(0, 7, 0), x_dir=(1, 0, 0), z_dir=(0, 1, 0)).offset(BOSS_EXTRUDE6_START)):
        with Locations(Location((-31.113, 0, 0), (0, 0, 270))):
            Circle(SKETCH15_R)
        Polygon((-31.613, 0.6), (-31.613, 8), (-30.613, 8), (-30.613, 0.6), (-23.113, 0.6), (-23.113, -0.6), (-30.613, -0.6), (-30.613, -8), (-31.613, -8), (-31.613, -0.6), (-39.113, -0.6), (-39.113, 0.6), align=None, mode=Mode.SUBTRACT)
    extrude(amount=BOSS_EXTRUDE6_DEPTH)


solid = part.part
